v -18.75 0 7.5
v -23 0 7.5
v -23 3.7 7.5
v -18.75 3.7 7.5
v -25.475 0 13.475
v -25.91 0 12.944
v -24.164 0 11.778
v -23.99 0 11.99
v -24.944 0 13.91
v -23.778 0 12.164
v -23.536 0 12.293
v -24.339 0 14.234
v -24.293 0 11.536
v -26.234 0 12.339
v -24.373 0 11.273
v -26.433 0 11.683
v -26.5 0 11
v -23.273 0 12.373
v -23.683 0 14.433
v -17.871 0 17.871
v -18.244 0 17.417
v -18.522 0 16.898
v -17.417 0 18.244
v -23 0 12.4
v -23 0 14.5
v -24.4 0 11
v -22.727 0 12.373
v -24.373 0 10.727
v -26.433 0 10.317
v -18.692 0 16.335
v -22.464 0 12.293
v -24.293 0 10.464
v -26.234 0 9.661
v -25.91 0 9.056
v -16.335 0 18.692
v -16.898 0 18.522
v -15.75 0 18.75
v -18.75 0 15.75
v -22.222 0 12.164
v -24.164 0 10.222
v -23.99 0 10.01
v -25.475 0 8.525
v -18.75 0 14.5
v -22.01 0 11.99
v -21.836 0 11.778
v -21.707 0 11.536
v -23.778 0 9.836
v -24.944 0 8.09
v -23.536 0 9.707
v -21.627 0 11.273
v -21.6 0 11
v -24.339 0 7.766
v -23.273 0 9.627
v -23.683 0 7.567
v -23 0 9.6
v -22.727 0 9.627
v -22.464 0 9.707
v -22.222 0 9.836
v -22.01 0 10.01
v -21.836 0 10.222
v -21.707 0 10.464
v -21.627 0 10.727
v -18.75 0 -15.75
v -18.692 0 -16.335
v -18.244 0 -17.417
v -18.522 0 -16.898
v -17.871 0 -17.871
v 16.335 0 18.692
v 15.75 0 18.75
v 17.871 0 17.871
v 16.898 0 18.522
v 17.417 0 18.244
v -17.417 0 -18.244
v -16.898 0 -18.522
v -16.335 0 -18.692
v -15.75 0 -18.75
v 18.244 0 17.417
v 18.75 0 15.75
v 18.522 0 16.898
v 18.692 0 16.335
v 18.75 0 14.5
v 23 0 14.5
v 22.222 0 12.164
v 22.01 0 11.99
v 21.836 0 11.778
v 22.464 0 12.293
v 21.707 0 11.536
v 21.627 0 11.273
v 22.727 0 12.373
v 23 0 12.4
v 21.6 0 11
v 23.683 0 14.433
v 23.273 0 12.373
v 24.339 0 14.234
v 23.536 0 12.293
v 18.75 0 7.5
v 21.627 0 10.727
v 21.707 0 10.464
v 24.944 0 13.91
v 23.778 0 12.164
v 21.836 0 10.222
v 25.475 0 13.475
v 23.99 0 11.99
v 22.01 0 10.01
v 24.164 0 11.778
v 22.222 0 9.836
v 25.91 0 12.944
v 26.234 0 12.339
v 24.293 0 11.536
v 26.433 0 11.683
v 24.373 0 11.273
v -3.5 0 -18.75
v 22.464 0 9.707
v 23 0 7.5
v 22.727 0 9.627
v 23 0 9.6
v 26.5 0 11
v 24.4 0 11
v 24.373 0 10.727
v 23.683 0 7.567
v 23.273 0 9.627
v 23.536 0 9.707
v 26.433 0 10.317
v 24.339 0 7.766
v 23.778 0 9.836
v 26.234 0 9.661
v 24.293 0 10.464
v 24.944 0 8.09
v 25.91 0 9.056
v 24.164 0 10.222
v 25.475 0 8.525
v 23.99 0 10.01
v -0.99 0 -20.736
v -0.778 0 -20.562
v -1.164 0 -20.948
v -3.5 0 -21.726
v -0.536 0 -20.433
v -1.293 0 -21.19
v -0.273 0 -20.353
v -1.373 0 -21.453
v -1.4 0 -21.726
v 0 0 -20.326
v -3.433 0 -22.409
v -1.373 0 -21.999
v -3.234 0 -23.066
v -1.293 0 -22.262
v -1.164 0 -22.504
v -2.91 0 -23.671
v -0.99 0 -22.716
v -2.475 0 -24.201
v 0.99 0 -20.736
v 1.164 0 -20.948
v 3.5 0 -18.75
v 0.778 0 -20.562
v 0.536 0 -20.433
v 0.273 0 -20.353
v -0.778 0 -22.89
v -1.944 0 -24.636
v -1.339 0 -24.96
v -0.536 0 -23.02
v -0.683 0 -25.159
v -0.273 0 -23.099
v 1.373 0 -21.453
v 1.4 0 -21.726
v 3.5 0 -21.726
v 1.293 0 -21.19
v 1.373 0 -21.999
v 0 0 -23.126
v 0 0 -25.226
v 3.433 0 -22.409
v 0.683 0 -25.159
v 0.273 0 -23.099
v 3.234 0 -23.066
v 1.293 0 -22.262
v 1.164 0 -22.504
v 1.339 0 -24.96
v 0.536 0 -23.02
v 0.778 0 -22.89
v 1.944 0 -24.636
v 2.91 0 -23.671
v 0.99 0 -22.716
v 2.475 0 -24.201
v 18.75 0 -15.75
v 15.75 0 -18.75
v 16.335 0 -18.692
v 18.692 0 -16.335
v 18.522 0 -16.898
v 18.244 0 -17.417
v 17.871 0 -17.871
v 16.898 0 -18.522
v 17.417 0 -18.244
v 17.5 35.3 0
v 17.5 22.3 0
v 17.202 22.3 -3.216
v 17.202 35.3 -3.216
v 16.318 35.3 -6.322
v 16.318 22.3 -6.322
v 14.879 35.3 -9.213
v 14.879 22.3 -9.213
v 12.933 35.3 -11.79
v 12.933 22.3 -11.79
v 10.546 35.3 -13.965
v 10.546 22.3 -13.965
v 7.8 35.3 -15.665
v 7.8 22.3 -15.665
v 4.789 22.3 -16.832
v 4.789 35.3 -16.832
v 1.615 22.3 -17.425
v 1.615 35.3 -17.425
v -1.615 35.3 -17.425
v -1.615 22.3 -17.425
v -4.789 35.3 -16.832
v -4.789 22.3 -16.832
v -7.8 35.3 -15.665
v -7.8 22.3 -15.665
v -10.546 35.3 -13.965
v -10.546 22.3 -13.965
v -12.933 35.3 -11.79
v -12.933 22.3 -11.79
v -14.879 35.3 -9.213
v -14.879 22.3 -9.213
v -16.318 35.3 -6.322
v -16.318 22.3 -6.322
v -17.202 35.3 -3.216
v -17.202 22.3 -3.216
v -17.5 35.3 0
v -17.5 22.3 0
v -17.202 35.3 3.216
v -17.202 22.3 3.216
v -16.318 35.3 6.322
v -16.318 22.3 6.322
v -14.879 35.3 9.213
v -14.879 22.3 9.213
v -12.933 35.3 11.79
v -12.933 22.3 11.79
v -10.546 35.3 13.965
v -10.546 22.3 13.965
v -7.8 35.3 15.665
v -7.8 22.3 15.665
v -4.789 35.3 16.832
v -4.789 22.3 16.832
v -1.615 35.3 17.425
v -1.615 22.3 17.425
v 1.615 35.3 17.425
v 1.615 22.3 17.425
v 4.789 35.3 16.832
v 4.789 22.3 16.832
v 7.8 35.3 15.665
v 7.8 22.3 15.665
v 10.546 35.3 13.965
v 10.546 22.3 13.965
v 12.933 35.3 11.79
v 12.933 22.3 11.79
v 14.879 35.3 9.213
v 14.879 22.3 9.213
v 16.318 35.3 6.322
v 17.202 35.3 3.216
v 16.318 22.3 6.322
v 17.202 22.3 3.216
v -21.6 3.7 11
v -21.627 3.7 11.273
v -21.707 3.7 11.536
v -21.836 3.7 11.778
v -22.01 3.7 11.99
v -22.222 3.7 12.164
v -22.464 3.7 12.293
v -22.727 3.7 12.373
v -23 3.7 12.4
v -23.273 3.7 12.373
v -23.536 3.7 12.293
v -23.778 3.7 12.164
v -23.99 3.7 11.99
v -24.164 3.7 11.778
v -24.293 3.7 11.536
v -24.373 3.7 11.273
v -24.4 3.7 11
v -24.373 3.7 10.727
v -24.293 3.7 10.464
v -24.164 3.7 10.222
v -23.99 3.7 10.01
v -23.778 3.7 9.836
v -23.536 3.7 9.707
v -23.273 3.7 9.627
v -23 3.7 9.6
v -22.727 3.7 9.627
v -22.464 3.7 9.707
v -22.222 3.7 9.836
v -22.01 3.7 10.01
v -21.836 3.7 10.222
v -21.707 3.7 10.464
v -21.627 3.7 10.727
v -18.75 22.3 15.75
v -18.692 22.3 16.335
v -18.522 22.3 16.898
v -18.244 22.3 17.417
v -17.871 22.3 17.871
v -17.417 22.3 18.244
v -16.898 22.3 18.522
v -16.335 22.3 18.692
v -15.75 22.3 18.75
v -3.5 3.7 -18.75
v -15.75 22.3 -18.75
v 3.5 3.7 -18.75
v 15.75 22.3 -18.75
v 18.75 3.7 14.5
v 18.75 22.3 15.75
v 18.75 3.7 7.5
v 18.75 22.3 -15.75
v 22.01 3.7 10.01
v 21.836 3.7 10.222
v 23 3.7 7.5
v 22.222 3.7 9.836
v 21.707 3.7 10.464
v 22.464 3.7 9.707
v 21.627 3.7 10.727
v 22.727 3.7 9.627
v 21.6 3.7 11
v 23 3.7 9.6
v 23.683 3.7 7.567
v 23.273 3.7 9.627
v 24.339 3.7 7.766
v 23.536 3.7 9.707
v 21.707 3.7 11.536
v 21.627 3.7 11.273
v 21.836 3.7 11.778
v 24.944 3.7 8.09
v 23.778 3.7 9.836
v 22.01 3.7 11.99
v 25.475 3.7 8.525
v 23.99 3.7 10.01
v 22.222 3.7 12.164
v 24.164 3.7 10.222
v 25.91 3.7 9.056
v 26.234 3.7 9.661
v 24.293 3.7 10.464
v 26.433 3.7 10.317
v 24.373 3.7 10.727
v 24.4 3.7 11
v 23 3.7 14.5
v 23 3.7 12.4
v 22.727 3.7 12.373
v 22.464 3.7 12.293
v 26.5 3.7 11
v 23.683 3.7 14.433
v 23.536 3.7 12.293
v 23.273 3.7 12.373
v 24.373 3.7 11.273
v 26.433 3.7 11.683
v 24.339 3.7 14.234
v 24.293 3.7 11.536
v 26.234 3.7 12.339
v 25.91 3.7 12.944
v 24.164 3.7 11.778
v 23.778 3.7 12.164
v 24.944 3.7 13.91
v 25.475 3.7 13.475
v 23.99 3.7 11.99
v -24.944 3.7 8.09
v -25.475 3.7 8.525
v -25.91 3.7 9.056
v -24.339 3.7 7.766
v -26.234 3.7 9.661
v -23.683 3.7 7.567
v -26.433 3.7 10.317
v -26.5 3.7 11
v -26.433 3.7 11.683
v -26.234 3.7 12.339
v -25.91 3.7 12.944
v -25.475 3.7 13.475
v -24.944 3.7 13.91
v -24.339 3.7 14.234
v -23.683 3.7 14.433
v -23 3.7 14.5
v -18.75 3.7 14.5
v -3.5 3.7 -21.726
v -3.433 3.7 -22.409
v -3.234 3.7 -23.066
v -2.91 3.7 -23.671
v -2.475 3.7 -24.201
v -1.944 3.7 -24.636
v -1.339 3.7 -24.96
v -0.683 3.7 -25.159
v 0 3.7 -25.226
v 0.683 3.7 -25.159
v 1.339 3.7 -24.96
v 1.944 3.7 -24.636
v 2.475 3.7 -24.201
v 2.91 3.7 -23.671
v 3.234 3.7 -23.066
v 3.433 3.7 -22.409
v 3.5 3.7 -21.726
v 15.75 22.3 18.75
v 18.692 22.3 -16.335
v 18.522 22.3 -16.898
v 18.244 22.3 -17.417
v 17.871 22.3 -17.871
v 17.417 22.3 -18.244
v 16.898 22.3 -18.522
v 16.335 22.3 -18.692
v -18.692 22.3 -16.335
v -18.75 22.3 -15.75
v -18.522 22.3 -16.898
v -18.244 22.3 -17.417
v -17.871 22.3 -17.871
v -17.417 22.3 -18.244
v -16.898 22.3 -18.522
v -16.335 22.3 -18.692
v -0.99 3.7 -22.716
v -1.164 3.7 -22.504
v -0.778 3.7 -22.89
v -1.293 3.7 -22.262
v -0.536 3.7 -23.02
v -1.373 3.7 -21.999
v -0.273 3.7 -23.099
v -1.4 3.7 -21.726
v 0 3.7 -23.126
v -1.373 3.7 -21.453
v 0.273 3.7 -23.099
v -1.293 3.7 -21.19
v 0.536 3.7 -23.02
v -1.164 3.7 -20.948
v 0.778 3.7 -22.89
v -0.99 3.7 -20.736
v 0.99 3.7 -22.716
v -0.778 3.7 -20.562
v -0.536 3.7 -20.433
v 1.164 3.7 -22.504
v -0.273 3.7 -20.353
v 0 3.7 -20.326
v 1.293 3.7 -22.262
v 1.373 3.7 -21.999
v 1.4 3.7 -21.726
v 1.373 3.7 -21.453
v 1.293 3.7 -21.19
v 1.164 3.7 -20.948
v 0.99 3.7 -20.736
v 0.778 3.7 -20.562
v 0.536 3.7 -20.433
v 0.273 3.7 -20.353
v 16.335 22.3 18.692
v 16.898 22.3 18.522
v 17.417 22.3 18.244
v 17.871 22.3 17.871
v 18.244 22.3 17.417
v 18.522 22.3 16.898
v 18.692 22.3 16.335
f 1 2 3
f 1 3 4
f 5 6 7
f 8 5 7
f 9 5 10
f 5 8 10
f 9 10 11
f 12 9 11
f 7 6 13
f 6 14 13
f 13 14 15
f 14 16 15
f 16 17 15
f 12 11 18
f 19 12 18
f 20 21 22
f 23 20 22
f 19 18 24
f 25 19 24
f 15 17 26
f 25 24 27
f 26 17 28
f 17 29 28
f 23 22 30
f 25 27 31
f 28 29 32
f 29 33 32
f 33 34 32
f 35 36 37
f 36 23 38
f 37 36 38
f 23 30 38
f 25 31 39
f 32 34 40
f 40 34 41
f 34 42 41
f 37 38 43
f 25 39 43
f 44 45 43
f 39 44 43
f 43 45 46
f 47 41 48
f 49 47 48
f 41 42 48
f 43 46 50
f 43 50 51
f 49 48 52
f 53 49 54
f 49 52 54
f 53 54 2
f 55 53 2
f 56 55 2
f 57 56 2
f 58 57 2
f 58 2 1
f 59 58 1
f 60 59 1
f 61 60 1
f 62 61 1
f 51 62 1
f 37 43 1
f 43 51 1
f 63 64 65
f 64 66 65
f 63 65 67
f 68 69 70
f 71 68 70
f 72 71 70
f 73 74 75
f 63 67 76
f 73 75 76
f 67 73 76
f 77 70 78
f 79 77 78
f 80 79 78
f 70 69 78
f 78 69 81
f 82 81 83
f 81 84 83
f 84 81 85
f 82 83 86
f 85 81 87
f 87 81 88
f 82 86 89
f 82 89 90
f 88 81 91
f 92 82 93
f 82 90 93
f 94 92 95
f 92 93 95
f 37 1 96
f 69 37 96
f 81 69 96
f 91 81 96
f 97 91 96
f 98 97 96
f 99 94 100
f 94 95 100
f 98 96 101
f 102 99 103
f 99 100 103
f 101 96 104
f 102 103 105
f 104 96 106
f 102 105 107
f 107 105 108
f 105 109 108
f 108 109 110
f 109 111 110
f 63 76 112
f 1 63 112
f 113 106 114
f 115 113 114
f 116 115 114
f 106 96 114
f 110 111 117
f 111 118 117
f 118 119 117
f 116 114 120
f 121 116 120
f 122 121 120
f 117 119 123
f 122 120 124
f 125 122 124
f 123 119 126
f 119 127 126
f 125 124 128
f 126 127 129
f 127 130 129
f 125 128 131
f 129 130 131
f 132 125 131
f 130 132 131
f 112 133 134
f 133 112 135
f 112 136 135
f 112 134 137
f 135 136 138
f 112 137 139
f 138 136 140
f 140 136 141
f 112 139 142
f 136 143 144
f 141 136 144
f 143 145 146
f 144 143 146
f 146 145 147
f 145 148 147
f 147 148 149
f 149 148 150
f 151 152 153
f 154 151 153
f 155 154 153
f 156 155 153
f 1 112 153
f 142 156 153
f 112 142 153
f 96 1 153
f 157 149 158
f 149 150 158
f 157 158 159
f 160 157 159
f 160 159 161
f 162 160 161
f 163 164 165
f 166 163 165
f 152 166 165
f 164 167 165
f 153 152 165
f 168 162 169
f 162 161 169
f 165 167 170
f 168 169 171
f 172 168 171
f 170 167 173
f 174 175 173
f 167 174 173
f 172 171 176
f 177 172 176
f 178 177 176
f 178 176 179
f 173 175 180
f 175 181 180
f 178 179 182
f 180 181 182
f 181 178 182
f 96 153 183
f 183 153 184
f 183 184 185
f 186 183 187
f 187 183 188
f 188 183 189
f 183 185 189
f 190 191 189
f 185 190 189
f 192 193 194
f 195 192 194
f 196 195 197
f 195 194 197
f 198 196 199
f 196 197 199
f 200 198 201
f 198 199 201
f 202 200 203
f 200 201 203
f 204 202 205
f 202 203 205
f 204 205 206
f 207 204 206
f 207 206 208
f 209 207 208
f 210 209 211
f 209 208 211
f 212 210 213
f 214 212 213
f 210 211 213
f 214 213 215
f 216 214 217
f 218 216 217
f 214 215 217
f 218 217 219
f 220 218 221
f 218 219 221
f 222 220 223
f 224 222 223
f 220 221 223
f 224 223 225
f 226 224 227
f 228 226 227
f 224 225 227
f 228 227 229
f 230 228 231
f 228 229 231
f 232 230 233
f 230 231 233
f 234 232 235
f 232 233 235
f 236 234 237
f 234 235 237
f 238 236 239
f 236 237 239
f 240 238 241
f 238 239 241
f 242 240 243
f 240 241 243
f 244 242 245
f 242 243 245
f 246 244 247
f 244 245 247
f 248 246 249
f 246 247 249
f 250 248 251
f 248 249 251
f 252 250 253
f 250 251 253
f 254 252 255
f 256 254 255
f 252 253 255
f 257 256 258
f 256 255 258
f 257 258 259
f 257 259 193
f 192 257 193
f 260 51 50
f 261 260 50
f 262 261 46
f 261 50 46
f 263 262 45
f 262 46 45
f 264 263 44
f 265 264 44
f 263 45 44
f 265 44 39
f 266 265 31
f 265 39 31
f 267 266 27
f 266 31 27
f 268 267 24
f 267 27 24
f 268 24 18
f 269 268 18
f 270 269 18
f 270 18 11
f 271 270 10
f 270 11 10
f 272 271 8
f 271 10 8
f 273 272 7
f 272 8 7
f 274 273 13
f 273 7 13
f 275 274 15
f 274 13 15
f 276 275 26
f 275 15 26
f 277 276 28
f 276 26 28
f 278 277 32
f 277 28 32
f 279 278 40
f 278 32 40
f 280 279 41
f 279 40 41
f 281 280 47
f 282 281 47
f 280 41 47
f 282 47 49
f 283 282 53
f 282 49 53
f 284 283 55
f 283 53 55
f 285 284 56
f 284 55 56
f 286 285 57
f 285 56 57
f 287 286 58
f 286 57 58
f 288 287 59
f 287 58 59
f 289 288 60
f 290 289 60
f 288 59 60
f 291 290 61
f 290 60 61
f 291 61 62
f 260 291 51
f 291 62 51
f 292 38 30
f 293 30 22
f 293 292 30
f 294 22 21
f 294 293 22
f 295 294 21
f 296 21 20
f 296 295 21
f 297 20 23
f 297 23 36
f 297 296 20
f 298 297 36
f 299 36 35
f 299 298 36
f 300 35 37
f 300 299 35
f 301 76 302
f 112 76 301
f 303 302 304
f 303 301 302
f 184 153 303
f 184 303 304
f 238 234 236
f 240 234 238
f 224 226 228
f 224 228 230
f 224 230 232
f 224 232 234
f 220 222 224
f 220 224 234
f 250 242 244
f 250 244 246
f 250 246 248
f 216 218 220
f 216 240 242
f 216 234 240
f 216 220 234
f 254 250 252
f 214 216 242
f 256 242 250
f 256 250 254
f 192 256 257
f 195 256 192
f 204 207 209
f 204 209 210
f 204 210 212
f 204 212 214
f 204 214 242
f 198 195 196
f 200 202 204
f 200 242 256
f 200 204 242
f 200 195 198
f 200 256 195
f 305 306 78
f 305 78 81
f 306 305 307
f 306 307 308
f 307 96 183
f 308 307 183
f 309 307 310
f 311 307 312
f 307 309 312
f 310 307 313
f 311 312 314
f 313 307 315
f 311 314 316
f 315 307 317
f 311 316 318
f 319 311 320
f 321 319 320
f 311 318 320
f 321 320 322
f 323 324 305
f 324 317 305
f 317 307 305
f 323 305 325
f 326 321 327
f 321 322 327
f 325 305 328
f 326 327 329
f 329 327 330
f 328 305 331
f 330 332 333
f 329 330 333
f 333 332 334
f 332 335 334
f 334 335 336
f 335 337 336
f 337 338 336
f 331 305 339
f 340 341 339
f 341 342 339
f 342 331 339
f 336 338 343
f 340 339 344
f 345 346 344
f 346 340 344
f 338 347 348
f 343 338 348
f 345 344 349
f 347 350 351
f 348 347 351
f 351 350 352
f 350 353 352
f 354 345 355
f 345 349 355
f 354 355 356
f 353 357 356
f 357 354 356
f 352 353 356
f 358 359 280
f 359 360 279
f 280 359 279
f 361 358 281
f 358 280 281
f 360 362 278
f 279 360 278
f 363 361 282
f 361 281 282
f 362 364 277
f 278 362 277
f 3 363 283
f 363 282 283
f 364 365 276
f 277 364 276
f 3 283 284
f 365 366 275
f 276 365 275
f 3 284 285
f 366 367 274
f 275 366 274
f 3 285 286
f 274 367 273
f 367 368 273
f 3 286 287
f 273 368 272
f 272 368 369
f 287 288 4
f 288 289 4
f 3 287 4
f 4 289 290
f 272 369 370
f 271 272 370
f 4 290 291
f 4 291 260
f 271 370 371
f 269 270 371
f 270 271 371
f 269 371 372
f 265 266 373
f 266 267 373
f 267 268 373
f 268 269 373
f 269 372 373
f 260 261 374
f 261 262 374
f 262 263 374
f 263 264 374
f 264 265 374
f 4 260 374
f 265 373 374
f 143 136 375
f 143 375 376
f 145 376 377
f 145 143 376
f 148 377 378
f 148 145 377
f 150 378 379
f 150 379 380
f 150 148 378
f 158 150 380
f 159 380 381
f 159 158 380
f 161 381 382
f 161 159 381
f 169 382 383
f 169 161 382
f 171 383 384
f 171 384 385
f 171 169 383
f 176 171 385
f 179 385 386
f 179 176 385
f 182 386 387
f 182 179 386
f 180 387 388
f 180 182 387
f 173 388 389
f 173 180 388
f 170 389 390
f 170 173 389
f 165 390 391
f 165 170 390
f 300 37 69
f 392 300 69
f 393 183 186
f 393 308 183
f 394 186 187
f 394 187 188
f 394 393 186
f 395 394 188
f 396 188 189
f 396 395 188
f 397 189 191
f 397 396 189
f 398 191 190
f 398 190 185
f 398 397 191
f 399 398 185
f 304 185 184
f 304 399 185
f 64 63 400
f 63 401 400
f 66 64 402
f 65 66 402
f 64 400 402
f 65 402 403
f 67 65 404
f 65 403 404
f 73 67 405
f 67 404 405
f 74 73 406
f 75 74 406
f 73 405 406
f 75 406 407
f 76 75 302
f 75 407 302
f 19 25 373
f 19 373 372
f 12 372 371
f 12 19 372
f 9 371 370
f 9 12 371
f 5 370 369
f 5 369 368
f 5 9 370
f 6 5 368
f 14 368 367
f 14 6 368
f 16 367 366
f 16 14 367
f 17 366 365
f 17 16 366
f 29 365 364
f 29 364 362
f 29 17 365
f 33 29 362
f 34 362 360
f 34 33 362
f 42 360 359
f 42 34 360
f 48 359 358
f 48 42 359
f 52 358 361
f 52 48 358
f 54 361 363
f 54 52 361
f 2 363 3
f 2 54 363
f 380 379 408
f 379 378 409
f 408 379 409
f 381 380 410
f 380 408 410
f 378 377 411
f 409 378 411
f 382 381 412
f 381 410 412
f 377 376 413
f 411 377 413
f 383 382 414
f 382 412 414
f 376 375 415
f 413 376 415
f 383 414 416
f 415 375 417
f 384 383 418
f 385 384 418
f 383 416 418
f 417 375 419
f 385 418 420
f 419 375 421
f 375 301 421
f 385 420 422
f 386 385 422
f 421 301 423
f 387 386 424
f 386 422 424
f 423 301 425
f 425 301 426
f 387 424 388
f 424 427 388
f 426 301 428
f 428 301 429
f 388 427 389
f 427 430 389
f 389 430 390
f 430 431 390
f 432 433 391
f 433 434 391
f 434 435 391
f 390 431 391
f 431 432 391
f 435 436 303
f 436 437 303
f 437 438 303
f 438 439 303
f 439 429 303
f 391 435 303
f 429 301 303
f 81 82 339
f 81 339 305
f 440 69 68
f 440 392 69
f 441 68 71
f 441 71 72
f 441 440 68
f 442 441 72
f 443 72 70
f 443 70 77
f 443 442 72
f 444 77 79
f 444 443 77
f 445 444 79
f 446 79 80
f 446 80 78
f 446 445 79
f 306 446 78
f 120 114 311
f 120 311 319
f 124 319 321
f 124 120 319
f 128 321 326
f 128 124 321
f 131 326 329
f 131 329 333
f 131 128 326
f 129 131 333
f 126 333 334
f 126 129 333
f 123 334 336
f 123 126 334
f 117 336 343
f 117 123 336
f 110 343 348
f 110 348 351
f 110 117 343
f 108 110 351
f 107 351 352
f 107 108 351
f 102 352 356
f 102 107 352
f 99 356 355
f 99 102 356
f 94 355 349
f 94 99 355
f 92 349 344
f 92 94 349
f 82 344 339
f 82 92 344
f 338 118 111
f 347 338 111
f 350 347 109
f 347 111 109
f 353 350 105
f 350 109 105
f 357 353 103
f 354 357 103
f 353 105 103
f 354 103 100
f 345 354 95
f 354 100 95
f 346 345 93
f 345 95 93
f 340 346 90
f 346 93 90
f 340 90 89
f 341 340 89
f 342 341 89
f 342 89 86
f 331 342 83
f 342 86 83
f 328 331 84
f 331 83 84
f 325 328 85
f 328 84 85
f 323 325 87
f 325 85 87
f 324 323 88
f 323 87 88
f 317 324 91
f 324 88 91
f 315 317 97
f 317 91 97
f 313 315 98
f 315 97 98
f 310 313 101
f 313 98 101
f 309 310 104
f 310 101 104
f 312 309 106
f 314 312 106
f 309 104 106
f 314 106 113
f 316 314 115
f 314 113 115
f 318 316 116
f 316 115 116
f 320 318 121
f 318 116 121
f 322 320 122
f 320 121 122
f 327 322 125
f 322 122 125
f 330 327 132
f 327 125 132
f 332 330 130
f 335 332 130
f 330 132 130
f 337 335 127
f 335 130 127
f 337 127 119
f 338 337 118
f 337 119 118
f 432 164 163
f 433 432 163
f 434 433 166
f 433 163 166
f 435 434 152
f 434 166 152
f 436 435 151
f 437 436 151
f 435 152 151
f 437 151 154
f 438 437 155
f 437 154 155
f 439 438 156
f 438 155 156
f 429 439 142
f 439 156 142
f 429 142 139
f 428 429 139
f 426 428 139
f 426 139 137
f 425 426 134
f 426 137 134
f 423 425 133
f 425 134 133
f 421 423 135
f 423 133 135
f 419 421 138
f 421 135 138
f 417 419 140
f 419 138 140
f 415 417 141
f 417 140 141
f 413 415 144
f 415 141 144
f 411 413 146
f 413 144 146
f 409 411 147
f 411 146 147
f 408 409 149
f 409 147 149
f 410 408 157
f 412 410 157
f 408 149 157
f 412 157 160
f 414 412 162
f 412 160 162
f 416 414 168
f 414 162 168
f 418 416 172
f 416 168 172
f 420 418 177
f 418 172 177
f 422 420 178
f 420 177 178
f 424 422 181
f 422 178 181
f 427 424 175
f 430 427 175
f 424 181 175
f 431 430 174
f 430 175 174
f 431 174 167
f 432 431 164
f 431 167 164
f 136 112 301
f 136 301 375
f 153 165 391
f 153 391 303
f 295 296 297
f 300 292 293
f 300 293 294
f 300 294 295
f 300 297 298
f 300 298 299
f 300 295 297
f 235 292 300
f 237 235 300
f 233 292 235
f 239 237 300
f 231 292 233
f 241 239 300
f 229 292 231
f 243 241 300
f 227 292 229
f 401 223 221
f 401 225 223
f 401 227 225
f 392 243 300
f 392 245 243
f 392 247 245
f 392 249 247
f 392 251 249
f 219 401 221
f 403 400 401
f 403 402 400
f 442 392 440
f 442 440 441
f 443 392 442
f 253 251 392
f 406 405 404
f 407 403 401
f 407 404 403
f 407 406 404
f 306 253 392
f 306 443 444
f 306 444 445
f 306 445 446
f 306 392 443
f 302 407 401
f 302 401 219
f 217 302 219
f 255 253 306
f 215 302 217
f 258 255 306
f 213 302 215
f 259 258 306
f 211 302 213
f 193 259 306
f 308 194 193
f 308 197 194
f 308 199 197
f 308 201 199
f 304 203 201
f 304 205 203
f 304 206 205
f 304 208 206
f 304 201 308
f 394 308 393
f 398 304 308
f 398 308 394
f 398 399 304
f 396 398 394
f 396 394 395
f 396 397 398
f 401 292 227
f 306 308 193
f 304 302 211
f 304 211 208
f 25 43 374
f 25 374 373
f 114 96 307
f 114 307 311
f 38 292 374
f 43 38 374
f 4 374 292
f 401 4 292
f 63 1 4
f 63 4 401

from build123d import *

# Parameters (mm, degrees)
ESQUISSE1_W        = 37.5
ESQUISSE1_H        = 37.5
BOSS_EXTRU_1_DEPTH = 22.3
CONG_1_R           = 3
ESQUISSE2_R        = 17.5
BOSS_EXTRU_2_DEPTH = 13
ESQUISSE3_R        = 1.4
BOSS_EXTRU_3_DEPTH = 3.7


with BuildPart() as part:
    # Esquisse1 → Boss.-Extru.1 (new body)
    with BuildSketch(Plane(origin=(0, 0, 0), x_dir=(1, 0, 0), z_dir=(0, 1, 0))):
        Rectangle(ESQUISSE1_W, ESQUISSE1_H)
    extrude(amount=BOSS_EXTRU_1_DEPTH)

    # Congé1
    cong_1_edges = [part.edges().sort_by_distance(p)[0] for p in [
        (18.75, 11.15, 18.75),
        (-18.75, 11.15, 18.75),
        (-18.75, 11.15, -18.75),
        (18.75, 11.15, -18.75),
    ]]
    fillet(cong_1_edges, radius=CONG_1_R)

    # Esquisse2 → Boss.-Extru.2 (add)
    with BuildSketch(Plane(origin=(0, 22.3, 0), x_dir=(1, 0, 0), z_dir=(0, 1, 0))):
        Circle(ESQUISSE2_R)
    extrude(amount=BOSS_EXTRU_2_DEPTH)

    # Esquisse3 → Boss.-Extru.3 (add)
    with BuildSketch(Plane.XZ):
        with BuildLine():
            Line((-18.75, 14.5), (-23, 14.5))
            ThreePointArc((-23, 14.5), (-26.5, 11), (-23, 7.5))
            Line((-23, 7.5), (-18.75, 7.5))
            Line((-18.75, 7.5), (-18.75, 14.5))
        make_face()
        with Locations((-23, 11)):
            Circle(ESQUISSE3_R, mode=Mode.SUBTRACT)
        with BuildLine():
            Line((18.75, 7.5), (23, 7.5))
            ThreePointArc((23, 7.5), (26.5, 11), (23, 14.5))
            Line((23, 14.5), (18.75, 14.5))
            Line((18.75, 14.5), (18.75, 7.5))
        make_face()
        with Locations((23, 11)):
            Circle(ESQUISSE3_R, mode=Mode.SUBTRACT)
        with BuildLine():
            ThreePointArc((-3.5, -21.726136344), (0, -25.226136344), (3.5, -21.726136344))
            Line((3.5, -21.726136344), (3.5, -18.75))
            Line((3.5, -18.75), (-3.5, -18.75))
            Line((-3.5, -18.75), (-3.5, -21.726136344))
        make_face()
        with Locations((0, -21.726136344)):
            Circle(ESQUISSE3_R, mode=Mode.SUBTRACT)
    extrude(amount=-BOSS_EXTRU_3_DEPTH)


solid = part.part
